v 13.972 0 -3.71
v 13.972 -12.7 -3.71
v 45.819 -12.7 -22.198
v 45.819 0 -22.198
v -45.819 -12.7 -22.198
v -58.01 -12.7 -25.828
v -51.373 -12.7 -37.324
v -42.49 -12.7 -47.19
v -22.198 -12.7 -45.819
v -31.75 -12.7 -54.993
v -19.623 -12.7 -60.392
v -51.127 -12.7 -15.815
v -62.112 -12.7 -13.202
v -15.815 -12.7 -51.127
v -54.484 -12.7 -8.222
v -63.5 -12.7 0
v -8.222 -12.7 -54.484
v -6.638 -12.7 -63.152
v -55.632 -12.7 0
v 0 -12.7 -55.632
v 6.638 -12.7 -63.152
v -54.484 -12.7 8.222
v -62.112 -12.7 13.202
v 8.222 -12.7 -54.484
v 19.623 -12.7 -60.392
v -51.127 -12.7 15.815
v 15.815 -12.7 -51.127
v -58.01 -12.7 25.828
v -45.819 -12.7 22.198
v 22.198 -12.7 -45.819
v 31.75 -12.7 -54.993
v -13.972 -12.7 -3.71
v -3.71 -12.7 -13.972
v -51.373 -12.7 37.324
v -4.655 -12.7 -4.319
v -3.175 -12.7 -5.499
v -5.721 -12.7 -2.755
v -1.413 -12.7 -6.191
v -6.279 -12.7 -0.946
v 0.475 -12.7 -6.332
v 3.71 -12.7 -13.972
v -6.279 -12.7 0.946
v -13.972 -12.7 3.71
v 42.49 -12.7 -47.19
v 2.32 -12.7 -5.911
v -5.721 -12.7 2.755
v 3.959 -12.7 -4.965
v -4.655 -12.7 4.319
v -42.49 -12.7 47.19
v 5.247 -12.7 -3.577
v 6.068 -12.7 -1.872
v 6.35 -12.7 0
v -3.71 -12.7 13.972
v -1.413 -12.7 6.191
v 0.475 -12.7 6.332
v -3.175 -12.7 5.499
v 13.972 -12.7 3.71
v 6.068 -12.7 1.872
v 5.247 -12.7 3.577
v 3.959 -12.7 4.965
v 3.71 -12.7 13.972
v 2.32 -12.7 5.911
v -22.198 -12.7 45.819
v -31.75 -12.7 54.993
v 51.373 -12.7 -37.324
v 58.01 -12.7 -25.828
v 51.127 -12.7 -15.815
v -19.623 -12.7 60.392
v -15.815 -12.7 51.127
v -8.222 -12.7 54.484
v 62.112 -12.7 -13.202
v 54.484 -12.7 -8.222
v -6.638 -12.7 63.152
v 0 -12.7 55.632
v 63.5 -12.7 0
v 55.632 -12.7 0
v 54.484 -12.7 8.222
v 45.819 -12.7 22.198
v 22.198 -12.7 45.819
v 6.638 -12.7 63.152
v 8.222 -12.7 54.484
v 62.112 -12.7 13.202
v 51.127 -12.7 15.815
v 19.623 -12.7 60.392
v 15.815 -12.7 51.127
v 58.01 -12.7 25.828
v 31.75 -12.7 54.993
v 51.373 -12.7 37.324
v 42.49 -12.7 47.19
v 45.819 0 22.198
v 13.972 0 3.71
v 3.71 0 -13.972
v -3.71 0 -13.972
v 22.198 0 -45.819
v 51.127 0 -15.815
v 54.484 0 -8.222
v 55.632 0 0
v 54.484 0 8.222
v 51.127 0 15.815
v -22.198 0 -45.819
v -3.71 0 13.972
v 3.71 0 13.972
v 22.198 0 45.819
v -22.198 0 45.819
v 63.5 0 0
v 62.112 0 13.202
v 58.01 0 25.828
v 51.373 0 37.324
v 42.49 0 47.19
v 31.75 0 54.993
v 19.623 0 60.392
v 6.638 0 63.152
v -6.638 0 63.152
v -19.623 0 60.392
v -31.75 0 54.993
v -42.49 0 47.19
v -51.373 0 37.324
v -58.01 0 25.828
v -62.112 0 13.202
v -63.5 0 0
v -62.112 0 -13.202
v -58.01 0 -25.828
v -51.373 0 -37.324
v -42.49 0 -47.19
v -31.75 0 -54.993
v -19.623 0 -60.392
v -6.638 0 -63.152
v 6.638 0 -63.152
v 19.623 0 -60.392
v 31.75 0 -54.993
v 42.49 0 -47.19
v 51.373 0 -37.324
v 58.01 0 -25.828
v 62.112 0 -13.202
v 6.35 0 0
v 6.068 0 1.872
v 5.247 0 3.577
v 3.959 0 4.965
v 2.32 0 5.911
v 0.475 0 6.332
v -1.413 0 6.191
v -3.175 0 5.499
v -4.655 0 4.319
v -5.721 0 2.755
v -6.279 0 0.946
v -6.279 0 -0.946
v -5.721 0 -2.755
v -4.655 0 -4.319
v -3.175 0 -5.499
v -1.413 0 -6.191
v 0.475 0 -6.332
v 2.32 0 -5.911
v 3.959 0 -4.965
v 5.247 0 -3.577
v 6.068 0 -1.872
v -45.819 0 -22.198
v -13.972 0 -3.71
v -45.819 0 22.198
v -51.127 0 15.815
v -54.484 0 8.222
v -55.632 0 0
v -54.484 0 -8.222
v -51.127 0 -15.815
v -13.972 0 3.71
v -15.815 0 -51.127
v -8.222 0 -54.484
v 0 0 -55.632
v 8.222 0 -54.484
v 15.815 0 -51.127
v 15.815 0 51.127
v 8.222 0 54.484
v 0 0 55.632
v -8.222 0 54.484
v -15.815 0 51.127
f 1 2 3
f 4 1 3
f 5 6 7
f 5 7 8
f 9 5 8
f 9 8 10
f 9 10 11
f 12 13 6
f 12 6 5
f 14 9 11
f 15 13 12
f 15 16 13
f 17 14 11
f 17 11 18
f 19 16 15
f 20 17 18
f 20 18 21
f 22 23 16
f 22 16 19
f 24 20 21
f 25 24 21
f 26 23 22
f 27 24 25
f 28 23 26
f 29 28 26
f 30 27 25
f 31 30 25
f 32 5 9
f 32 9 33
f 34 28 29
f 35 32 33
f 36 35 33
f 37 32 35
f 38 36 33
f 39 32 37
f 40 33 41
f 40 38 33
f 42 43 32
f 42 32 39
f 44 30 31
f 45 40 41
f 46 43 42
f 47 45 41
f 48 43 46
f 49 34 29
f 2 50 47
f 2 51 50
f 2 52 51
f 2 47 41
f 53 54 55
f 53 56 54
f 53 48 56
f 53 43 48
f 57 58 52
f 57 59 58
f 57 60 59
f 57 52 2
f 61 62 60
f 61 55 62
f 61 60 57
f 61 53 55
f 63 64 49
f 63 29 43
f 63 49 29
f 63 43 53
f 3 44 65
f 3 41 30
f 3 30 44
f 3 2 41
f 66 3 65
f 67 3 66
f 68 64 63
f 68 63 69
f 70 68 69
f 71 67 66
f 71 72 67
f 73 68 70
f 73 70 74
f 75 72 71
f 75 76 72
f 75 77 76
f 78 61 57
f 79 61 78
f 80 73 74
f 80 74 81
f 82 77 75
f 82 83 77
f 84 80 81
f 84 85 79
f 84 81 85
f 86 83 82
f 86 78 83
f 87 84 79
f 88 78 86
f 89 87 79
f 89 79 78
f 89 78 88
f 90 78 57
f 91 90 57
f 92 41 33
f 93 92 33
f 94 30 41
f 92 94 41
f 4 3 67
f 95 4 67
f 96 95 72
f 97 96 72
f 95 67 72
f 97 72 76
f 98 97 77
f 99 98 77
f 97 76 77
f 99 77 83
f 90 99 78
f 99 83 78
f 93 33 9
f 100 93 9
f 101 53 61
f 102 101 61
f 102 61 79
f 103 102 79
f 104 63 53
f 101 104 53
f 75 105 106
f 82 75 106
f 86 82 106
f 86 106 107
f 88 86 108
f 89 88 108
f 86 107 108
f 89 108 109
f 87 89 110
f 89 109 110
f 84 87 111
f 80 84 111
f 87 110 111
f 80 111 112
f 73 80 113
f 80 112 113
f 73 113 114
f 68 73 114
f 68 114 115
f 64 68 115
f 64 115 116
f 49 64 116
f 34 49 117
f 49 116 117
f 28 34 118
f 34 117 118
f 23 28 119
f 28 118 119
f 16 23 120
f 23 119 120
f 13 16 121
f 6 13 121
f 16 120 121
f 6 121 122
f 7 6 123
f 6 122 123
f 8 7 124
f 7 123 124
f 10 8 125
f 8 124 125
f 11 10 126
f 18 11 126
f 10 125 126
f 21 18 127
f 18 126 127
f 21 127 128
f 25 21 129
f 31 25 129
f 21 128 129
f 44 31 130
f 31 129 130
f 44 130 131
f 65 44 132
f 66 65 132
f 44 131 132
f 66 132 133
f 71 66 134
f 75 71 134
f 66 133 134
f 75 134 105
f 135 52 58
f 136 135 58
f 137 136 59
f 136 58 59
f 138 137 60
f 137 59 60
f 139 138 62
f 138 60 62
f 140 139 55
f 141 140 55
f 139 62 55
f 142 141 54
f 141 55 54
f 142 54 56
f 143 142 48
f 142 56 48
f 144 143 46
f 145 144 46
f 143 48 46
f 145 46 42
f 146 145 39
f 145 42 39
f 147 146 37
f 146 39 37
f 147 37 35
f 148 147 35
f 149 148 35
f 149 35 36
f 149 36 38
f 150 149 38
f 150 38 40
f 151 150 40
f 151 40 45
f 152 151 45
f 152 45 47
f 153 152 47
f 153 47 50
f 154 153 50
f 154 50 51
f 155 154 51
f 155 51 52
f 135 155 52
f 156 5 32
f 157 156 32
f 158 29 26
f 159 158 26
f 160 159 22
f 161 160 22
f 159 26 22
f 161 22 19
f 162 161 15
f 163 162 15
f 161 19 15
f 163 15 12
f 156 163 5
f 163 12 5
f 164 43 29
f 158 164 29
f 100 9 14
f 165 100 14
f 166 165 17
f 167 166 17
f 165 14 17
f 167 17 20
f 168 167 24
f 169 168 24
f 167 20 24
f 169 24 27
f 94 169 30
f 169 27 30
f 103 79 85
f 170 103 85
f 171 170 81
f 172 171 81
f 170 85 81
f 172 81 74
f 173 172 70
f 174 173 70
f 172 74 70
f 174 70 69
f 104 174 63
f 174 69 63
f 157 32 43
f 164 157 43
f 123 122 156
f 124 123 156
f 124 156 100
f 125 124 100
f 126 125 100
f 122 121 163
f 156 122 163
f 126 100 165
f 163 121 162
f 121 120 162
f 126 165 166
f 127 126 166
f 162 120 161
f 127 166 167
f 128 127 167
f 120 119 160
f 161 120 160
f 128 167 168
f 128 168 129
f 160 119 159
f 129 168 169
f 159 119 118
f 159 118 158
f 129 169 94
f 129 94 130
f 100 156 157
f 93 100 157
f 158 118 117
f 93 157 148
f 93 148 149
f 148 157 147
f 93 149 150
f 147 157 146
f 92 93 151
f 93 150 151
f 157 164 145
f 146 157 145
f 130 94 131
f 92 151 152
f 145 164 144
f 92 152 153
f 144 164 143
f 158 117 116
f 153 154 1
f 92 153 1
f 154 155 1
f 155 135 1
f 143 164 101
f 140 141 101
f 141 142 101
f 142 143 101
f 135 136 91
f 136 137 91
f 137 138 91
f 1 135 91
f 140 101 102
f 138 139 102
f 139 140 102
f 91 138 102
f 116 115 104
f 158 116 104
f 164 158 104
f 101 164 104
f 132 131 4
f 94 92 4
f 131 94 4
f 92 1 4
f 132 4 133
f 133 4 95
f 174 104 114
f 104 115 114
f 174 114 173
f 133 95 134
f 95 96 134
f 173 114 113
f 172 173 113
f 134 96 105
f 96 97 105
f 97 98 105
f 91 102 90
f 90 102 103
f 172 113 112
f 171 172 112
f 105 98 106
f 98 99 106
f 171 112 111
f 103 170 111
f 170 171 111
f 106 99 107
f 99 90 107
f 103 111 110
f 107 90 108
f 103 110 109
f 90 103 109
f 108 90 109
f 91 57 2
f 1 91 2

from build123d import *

# Parameters (mm, degrees)
F0_R            = 63.5
F1_DEPTH        = 12.7
F2_R            = 6.35
F3_DEPTH        = 12.701
F5_DEPTH        = 12.701
F5_COPIES_COUNT = 4


# Not quite as in the source:
# - a pattern or mirror of a feature is missing from the dataset's text; its kind, count and spacing are read off the source's solid


with BuildPart() as f1:
    # F0 (on Front) → F1 (new body)
    with BuildSketch(Plane.XZ):
        Circle(F0_R)
    extrude(amount=F1_DEPTH)

    # F2 (on face) → F3 (cut, through all)
    with BuildSketch(Plane.XZ.offset(12.7)):
        Circle(F2_R)
    extrude(amount=-F3_DEPTH, mode=Mode.SUBTRACT)

    # F4 (on face) → F5 (cut, through all)
    with BuildSketch(Plane.XZ.offset(12.7)):
        with BuildLine():
            Line((-22.1979282796, 45.8192452788), (-3.7104284856, 13.9721687883))
            Line((-3.7104284856, 13.9721687883), (3.7104284856, 13.9721687883))
            Line((3.7104284856, 13.9721687883), (22.1979282796, 45.8192452788))
            ThreePointArc((22.1979282796, 45.8192452788), (0, 55.6319138023), (-22.1979282796, 45.8192452788))
        make_face()
    f5 = extrude(amount=-F5_DEPTH, mode=Mode.SUBTRACT)

    # F5_copies: F5 ×4 about axis
    f5_copies_axis = Axis((0, 0, 0), (0, 1, 0))
    for i in range(1, F5_COPIES_COUNT):
        add(f5.rotate(f5_copies_axis, i * 360 / F5_COPIES_COUNT), mode=Mode.SUBTRACT)


solid = f1.part
